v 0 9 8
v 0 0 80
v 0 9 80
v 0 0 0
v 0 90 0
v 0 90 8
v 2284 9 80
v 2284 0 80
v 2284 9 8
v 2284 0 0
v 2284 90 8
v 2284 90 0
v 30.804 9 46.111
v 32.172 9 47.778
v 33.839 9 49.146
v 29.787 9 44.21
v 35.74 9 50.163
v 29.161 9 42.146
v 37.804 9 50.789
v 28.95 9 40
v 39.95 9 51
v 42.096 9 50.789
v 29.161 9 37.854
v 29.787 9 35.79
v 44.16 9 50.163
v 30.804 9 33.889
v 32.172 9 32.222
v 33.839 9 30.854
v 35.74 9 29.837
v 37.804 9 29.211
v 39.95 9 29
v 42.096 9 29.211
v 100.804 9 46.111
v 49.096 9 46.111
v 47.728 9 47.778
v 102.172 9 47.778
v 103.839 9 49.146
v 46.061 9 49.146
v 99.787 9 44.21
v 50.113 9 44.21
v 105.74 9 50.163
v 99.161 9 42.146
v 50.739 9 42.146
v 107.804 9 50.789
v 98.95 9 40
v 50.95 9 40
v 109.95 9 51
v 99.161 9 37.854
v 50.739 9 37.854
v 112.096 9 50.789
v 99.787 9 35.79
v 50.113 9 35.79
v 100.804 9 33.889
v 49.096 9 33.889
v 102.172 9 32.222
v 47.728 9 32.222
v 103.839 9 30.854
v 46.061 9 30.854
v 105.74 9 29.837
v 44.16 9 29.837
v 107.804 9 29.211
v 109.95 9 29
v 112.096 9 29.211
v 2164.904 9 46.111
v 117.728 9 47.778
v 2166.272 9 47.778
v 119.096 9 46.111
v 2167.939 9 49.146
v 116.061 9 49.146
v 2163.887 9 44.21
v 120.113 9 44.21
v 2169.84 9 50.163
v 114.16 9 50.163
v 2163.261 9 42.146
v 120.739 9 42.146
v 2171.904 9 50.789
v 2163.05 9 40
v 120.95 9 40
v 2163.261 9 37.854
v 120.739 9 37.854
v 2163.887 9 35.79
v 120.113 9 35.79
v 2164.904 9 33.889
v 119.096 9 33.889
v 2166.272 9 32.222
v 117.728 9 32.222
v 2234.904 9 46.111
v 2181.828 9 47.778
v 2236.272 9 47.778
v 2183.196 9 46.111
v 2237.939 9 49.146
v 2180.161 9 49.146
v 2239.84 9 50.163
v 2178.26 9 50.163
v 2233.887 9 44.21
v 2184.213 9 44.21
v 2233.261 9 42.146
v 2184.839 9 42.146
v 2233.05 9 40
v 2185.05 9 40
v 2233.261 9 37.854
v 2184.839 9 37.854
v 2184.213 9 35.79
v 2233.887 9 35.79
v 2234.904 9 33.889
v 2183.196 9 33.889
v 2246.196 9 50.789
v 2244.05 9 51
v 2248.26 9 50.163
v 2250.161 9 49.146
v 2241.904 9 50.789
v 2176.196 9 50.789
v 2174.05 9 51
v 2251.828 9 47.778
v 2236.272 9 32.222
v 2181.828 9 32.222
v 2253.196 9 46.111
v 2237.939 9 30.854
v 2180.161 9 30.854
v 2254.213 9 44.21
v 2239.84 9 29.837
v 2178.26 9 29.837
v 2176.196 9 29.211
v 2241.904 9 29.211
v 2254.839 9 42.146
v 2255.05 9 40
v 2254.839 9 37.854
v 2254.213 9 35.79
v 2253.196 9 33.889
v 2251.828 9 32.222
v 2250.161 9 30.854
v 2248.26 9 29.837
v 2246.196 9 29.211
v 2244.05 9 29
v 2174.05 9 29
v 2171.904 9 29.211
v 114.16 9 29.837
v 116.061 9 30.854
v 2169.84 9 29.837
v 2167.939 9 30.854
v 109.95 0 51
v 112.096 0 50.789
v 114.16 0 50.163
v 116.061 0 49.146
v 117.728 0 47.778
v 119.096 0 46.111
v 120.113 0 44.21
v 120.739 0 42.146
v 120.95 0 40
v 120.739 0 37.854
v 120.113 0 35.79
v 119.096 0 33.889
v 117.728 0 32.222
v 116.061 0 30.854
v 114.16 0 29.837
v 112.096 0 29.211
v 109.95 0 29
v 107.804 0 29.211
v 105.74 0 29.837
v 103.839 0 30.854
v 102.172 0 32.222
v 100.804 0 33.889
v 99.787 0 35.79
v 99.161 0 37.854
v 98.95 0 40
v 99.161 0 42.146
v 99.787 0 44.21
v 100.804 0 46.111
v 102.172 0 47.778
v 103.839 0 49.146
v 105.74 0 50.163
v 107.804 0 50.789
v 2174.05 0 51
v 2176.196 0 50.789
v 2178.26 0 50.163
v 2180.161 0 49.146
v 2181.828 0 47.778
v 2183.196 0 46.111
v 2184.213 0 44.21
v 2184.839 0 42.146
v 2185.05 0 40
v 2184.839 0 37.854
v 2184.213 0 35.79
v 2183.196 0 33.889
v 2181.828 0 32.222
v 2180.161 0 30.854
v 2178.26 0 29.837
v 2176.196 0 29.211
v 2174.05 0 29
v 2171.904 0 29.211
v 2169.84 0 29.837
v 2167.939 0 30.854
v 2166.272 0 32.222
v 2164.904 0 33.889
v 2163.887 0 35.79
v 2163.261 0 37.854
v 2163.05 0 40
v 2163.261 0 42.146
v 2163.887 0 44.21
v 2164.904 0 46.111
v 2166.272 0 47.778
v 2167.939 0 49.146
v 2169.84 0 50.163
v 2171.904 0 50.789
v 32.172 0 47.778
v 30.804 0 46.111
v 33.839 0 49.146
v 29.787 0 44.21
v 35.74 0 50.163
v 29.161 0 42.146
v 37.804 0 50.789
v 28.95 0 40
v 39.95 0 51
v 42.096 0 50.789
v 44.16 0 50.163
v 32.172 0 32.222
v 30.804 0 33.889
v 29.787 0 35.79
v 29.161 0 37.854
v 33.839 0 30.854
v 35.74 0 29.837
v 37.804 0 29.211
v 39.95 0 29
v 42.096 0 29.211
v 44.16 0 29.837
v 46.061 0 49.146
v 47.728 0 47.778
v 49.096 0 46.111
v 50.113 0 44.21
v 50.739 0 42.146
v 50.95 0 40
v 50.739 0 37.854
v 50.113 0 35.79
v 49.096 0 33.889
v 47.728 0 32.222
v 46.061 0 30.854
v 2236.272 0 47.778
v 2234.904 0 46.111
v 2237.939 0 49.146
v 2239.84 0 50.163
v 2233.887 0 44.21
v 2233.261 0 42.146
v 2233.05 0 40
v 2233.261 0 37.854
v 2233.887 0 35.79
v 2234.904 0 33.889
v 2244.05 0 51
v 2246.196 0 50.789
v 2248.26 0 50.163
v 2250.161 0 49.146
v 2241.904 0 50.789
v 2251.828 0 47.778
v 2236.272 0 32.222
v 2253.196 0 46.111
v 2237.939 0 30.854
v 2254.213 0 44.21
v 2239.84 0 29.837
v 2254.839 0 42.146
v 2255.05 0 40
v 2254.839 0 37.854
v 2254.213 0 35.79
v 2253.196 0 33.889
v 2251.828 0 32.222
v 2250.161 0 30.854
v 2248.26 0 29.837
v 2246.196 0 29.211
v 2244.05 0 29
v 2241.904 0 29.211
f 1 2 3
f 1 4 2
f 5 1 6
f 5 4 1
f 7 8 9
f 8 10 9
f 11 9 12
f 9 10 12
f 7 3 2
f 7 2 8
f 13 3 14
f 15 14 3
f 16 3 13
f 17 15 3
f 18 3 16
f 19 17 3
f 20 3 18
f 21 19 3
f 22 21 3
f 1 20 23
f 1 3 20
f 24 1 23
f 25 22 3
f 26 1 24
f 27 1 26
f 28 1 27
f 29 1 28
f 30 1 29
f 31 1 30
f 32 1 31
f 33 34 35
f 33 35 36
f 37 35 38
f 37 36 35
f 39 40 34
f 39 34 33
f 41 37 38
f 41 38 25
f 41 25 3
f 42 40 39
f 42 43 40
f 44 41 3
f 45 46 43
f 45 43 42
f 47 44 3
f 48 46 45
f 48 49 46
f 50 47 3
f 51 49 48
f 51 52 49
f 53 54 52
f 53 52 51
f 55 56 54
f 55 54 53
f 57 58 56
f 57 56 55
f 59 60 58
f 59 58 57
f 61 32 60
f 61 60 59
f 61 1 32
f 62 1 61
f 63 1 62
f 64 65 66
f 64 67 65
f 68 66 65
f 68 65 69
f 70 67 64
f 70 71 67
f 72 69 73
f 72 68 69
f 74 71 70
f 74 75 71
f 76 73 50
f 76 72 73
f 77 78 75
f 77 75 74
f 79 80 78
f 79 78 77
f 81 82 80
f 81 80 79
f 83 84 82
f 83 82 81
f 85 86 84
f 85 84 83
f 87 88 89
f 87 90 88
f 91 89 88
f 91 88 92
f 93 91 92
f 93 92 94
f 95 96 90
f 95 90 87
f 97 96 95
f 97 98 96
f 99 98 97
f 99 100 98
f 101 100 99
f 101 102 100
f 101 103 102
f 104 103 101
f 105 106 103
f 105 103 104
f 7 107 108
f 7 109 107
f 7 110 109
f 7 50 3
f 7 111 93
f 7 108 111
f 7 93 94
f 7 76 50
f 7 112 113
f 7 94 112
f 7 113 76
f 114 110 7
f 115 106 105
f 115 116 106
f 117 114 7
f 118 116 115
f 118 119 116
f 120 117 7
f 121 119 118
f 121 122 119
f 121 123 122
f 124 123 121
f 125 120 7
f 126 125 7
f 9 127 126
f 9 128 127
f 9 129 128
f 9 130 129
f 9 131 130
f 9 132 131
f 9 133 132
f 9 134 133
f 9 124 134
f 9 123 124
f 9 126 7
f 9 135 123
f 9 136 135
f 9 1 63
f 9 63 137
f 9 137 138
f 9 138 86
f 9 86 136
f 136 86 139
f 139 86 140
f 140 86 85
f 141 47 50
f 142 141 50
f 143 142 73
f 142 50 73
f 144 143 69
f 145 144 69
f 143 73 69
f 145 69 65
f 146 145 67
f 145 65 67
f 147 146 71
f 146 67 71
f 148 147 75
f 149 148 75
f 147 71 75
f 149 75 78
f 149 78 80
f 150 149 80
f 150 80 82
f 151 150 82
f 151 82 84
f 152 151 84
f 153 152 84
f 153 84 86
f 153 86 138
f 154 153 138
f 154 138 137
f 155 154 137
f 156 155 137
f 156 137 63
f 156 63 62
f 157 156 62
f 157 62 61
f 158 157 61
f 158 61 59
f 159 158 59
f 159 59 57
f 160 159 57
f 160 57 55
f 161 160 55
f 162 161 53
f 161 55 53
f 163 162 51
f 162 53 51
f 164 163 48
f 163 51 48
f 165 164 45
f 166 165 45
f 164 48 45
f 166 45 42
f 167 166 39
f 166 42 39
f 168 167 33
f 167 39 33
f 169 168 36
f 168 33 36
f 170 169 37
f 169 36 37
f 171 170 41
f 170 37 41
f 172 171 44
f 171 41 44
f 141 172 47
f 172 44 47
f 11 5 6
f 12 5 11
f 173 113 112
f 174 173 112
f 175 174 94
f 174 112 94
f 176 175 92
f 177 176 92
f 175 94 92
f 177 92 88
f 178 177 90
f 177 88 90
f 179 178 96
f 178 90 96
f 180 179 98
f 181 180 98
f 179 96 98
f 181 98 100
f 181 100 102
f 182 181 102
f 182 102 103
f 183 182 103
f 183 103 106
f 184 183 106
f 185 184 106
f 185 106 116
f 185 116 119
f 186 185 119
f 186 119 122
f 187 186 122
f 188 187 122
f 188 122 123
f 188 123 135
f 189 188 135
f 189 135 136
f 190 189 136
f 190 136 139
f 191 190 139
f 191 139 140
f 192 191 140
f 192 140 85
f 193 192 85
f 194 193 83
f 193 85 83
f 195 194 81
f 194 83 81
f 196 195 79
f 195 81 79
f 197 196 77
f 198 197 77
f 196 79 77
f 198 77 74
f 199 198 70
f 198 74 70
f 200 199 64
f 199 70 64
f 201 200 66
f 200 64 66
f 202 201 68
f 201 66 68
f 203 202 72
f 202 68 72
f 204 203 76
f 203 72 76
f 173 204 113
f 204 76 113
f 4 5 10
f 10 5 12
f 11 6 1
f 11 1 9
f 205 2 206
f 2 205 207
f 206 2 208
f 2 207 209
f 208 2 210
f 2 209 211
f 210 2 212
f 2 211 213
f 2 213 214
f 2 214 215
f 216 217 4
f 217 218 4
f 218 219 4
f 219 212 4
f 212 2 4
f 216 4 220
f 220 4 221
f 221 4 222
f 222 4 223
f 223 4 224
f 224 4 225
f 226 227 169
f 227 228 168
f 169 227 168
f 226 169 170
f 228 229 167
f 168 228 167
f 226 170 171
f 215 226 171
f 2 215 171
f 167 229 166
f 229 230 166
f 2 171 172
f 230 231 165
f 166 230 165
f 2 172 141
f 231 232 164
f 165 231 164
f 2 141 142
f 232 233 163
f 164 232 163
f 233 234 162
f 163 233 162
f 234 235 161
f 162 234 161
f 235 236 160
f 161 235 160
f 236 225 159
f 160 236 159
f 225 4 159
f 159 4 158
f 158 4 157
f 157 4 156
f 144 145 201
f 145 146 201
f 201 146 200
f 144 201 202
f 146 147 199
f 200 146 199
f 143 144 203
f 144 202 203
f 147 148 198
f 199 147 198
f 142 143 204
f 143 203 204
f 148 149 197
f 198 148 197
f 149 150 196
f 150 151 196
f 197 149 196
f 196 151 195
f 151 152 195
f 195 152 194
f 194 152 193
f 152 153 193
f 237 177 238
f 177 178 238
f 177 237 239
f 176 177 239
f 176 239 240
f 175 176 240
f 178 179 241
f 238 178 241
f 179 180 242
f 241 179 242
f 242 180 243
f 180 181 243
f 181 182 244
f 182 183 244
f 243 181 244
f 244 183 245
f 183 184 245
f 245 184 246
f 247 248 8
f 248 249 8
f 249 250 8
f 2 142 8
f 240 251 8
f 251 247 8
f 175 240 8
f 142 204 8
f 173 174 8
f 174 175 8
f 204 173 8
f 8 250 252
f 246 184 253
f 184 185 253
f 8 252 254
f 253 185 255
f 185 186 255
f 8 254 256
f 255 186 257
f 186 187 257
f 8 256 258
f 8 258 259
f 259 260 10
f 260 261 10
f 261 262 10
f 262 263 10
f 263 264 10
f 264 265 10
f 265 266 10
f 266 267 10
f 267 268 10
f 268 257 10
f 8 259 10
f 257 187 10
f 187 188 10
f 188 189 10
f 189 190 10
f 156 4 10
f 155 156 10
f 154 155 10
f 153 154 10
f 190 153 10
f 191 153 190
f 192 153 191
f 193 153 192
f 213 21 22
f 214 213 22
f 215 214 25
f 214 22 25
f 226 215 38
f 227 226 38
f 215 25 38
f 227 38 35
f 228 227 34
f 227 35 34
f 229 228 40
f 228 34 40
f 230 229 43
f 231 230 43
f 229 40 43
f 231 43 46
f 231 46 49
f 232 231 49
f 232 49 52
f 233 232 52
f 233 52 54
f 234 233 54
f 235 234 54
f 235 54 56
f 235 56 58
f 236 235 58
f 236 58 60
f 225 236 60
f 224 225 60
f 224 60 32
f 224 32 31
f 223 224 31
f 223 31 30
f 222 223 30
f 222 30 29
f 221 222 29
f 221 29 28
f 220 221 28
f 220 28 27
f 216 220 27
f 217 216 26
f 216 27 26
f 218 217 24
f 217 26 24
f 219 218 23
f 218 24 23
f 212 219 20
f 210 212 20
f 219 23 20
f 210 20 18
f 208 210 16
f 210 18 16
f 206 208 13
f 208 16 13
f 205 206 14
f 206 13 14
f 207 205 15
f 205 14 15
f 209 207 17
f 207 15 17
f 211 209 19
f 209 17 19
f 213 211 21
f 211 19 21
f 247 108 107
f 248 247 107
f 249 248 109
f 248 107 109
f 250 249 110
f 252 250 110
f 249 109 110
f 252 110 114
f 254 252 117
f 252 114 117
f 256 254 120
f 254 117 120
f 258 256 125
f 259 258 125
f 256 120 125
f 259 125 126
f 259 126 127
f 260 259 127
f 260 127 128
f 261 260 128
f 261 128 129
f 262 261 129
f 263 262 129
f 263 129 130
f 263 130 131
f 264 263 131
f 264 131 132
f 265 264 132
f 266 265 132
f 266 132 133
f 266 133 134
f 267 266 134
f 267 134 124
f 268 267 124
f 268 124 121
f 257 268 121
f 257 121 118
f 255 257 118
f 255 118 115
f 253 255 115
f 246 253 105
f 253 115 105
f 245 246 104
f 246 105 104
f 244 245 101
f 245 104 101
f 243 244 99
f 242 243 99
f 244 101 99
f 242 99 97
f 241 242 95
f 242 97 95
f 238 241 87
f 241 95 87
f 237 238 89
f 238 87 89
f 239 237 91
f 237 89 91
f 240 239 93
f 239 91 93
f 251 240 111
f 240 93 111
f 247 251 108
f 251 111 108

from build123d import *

# Parameters (mm, degrees)
SKETCH_263_W        = 2284
SKETCH_263_H        = 90
EXTRUDE_4_DEPTH     = 8
SKETCH_3_W          = 2284
SKETCH_3_H          = 9
EXTRUDE_5_DEPTH     = 72
SKETCH_4_R          = 11
CUT_EXTRUDE_2_DEPTH = 2287.835586569


with BuildPart() as part:
    # Sketch 263 → 拉伸4 (new body)
    with BuildSketch(Plane.XY):
        with Locations((1142, 45)):
            Rectangle(SKETCH_263_W, SKETCH_263_H)
    extrude(amount=EXTRUDE_4_DEPTH)

    # 草图3 → 拉伸5 (add)
    with BuildSketch(Plane.XY.offset(8)):
        with Locations((1142, 4.5)):
            Rectangle(SKETCH_3_W, SKETCH_3_H)
    extrude(amount=EXTRUDE_5_DEPTH)

    # 草图4 → 切除-拉伸2 (cut, through all)
    with BuildSketch(Plane(origin=(0, 9, 0), x_dir=(1, 0, 0), z_dir=(0, 1, 0))):
        with Locations(Location((39.95, -40, 0), (0, 0, 270))):
            Circle(SKETCH_4_R)
        with Locations(Location((109.95, -40, 0), (0, 0, 270))):
            Circle(SKETCH_4_R)
        with Locations(Location((2174.05, -40, 0), (0, 0, 270))):
            Circle(SKETCH_4_R)
        with Locations(Location((2244.05, -40, 0), (0, 0, 270))):
            Circle(SKETCH_4_R)
    extrude(amount=-CUT_EXTRUDE_2_DEPTH, mode=Mode.SUBTRACT)


solid = part.part
